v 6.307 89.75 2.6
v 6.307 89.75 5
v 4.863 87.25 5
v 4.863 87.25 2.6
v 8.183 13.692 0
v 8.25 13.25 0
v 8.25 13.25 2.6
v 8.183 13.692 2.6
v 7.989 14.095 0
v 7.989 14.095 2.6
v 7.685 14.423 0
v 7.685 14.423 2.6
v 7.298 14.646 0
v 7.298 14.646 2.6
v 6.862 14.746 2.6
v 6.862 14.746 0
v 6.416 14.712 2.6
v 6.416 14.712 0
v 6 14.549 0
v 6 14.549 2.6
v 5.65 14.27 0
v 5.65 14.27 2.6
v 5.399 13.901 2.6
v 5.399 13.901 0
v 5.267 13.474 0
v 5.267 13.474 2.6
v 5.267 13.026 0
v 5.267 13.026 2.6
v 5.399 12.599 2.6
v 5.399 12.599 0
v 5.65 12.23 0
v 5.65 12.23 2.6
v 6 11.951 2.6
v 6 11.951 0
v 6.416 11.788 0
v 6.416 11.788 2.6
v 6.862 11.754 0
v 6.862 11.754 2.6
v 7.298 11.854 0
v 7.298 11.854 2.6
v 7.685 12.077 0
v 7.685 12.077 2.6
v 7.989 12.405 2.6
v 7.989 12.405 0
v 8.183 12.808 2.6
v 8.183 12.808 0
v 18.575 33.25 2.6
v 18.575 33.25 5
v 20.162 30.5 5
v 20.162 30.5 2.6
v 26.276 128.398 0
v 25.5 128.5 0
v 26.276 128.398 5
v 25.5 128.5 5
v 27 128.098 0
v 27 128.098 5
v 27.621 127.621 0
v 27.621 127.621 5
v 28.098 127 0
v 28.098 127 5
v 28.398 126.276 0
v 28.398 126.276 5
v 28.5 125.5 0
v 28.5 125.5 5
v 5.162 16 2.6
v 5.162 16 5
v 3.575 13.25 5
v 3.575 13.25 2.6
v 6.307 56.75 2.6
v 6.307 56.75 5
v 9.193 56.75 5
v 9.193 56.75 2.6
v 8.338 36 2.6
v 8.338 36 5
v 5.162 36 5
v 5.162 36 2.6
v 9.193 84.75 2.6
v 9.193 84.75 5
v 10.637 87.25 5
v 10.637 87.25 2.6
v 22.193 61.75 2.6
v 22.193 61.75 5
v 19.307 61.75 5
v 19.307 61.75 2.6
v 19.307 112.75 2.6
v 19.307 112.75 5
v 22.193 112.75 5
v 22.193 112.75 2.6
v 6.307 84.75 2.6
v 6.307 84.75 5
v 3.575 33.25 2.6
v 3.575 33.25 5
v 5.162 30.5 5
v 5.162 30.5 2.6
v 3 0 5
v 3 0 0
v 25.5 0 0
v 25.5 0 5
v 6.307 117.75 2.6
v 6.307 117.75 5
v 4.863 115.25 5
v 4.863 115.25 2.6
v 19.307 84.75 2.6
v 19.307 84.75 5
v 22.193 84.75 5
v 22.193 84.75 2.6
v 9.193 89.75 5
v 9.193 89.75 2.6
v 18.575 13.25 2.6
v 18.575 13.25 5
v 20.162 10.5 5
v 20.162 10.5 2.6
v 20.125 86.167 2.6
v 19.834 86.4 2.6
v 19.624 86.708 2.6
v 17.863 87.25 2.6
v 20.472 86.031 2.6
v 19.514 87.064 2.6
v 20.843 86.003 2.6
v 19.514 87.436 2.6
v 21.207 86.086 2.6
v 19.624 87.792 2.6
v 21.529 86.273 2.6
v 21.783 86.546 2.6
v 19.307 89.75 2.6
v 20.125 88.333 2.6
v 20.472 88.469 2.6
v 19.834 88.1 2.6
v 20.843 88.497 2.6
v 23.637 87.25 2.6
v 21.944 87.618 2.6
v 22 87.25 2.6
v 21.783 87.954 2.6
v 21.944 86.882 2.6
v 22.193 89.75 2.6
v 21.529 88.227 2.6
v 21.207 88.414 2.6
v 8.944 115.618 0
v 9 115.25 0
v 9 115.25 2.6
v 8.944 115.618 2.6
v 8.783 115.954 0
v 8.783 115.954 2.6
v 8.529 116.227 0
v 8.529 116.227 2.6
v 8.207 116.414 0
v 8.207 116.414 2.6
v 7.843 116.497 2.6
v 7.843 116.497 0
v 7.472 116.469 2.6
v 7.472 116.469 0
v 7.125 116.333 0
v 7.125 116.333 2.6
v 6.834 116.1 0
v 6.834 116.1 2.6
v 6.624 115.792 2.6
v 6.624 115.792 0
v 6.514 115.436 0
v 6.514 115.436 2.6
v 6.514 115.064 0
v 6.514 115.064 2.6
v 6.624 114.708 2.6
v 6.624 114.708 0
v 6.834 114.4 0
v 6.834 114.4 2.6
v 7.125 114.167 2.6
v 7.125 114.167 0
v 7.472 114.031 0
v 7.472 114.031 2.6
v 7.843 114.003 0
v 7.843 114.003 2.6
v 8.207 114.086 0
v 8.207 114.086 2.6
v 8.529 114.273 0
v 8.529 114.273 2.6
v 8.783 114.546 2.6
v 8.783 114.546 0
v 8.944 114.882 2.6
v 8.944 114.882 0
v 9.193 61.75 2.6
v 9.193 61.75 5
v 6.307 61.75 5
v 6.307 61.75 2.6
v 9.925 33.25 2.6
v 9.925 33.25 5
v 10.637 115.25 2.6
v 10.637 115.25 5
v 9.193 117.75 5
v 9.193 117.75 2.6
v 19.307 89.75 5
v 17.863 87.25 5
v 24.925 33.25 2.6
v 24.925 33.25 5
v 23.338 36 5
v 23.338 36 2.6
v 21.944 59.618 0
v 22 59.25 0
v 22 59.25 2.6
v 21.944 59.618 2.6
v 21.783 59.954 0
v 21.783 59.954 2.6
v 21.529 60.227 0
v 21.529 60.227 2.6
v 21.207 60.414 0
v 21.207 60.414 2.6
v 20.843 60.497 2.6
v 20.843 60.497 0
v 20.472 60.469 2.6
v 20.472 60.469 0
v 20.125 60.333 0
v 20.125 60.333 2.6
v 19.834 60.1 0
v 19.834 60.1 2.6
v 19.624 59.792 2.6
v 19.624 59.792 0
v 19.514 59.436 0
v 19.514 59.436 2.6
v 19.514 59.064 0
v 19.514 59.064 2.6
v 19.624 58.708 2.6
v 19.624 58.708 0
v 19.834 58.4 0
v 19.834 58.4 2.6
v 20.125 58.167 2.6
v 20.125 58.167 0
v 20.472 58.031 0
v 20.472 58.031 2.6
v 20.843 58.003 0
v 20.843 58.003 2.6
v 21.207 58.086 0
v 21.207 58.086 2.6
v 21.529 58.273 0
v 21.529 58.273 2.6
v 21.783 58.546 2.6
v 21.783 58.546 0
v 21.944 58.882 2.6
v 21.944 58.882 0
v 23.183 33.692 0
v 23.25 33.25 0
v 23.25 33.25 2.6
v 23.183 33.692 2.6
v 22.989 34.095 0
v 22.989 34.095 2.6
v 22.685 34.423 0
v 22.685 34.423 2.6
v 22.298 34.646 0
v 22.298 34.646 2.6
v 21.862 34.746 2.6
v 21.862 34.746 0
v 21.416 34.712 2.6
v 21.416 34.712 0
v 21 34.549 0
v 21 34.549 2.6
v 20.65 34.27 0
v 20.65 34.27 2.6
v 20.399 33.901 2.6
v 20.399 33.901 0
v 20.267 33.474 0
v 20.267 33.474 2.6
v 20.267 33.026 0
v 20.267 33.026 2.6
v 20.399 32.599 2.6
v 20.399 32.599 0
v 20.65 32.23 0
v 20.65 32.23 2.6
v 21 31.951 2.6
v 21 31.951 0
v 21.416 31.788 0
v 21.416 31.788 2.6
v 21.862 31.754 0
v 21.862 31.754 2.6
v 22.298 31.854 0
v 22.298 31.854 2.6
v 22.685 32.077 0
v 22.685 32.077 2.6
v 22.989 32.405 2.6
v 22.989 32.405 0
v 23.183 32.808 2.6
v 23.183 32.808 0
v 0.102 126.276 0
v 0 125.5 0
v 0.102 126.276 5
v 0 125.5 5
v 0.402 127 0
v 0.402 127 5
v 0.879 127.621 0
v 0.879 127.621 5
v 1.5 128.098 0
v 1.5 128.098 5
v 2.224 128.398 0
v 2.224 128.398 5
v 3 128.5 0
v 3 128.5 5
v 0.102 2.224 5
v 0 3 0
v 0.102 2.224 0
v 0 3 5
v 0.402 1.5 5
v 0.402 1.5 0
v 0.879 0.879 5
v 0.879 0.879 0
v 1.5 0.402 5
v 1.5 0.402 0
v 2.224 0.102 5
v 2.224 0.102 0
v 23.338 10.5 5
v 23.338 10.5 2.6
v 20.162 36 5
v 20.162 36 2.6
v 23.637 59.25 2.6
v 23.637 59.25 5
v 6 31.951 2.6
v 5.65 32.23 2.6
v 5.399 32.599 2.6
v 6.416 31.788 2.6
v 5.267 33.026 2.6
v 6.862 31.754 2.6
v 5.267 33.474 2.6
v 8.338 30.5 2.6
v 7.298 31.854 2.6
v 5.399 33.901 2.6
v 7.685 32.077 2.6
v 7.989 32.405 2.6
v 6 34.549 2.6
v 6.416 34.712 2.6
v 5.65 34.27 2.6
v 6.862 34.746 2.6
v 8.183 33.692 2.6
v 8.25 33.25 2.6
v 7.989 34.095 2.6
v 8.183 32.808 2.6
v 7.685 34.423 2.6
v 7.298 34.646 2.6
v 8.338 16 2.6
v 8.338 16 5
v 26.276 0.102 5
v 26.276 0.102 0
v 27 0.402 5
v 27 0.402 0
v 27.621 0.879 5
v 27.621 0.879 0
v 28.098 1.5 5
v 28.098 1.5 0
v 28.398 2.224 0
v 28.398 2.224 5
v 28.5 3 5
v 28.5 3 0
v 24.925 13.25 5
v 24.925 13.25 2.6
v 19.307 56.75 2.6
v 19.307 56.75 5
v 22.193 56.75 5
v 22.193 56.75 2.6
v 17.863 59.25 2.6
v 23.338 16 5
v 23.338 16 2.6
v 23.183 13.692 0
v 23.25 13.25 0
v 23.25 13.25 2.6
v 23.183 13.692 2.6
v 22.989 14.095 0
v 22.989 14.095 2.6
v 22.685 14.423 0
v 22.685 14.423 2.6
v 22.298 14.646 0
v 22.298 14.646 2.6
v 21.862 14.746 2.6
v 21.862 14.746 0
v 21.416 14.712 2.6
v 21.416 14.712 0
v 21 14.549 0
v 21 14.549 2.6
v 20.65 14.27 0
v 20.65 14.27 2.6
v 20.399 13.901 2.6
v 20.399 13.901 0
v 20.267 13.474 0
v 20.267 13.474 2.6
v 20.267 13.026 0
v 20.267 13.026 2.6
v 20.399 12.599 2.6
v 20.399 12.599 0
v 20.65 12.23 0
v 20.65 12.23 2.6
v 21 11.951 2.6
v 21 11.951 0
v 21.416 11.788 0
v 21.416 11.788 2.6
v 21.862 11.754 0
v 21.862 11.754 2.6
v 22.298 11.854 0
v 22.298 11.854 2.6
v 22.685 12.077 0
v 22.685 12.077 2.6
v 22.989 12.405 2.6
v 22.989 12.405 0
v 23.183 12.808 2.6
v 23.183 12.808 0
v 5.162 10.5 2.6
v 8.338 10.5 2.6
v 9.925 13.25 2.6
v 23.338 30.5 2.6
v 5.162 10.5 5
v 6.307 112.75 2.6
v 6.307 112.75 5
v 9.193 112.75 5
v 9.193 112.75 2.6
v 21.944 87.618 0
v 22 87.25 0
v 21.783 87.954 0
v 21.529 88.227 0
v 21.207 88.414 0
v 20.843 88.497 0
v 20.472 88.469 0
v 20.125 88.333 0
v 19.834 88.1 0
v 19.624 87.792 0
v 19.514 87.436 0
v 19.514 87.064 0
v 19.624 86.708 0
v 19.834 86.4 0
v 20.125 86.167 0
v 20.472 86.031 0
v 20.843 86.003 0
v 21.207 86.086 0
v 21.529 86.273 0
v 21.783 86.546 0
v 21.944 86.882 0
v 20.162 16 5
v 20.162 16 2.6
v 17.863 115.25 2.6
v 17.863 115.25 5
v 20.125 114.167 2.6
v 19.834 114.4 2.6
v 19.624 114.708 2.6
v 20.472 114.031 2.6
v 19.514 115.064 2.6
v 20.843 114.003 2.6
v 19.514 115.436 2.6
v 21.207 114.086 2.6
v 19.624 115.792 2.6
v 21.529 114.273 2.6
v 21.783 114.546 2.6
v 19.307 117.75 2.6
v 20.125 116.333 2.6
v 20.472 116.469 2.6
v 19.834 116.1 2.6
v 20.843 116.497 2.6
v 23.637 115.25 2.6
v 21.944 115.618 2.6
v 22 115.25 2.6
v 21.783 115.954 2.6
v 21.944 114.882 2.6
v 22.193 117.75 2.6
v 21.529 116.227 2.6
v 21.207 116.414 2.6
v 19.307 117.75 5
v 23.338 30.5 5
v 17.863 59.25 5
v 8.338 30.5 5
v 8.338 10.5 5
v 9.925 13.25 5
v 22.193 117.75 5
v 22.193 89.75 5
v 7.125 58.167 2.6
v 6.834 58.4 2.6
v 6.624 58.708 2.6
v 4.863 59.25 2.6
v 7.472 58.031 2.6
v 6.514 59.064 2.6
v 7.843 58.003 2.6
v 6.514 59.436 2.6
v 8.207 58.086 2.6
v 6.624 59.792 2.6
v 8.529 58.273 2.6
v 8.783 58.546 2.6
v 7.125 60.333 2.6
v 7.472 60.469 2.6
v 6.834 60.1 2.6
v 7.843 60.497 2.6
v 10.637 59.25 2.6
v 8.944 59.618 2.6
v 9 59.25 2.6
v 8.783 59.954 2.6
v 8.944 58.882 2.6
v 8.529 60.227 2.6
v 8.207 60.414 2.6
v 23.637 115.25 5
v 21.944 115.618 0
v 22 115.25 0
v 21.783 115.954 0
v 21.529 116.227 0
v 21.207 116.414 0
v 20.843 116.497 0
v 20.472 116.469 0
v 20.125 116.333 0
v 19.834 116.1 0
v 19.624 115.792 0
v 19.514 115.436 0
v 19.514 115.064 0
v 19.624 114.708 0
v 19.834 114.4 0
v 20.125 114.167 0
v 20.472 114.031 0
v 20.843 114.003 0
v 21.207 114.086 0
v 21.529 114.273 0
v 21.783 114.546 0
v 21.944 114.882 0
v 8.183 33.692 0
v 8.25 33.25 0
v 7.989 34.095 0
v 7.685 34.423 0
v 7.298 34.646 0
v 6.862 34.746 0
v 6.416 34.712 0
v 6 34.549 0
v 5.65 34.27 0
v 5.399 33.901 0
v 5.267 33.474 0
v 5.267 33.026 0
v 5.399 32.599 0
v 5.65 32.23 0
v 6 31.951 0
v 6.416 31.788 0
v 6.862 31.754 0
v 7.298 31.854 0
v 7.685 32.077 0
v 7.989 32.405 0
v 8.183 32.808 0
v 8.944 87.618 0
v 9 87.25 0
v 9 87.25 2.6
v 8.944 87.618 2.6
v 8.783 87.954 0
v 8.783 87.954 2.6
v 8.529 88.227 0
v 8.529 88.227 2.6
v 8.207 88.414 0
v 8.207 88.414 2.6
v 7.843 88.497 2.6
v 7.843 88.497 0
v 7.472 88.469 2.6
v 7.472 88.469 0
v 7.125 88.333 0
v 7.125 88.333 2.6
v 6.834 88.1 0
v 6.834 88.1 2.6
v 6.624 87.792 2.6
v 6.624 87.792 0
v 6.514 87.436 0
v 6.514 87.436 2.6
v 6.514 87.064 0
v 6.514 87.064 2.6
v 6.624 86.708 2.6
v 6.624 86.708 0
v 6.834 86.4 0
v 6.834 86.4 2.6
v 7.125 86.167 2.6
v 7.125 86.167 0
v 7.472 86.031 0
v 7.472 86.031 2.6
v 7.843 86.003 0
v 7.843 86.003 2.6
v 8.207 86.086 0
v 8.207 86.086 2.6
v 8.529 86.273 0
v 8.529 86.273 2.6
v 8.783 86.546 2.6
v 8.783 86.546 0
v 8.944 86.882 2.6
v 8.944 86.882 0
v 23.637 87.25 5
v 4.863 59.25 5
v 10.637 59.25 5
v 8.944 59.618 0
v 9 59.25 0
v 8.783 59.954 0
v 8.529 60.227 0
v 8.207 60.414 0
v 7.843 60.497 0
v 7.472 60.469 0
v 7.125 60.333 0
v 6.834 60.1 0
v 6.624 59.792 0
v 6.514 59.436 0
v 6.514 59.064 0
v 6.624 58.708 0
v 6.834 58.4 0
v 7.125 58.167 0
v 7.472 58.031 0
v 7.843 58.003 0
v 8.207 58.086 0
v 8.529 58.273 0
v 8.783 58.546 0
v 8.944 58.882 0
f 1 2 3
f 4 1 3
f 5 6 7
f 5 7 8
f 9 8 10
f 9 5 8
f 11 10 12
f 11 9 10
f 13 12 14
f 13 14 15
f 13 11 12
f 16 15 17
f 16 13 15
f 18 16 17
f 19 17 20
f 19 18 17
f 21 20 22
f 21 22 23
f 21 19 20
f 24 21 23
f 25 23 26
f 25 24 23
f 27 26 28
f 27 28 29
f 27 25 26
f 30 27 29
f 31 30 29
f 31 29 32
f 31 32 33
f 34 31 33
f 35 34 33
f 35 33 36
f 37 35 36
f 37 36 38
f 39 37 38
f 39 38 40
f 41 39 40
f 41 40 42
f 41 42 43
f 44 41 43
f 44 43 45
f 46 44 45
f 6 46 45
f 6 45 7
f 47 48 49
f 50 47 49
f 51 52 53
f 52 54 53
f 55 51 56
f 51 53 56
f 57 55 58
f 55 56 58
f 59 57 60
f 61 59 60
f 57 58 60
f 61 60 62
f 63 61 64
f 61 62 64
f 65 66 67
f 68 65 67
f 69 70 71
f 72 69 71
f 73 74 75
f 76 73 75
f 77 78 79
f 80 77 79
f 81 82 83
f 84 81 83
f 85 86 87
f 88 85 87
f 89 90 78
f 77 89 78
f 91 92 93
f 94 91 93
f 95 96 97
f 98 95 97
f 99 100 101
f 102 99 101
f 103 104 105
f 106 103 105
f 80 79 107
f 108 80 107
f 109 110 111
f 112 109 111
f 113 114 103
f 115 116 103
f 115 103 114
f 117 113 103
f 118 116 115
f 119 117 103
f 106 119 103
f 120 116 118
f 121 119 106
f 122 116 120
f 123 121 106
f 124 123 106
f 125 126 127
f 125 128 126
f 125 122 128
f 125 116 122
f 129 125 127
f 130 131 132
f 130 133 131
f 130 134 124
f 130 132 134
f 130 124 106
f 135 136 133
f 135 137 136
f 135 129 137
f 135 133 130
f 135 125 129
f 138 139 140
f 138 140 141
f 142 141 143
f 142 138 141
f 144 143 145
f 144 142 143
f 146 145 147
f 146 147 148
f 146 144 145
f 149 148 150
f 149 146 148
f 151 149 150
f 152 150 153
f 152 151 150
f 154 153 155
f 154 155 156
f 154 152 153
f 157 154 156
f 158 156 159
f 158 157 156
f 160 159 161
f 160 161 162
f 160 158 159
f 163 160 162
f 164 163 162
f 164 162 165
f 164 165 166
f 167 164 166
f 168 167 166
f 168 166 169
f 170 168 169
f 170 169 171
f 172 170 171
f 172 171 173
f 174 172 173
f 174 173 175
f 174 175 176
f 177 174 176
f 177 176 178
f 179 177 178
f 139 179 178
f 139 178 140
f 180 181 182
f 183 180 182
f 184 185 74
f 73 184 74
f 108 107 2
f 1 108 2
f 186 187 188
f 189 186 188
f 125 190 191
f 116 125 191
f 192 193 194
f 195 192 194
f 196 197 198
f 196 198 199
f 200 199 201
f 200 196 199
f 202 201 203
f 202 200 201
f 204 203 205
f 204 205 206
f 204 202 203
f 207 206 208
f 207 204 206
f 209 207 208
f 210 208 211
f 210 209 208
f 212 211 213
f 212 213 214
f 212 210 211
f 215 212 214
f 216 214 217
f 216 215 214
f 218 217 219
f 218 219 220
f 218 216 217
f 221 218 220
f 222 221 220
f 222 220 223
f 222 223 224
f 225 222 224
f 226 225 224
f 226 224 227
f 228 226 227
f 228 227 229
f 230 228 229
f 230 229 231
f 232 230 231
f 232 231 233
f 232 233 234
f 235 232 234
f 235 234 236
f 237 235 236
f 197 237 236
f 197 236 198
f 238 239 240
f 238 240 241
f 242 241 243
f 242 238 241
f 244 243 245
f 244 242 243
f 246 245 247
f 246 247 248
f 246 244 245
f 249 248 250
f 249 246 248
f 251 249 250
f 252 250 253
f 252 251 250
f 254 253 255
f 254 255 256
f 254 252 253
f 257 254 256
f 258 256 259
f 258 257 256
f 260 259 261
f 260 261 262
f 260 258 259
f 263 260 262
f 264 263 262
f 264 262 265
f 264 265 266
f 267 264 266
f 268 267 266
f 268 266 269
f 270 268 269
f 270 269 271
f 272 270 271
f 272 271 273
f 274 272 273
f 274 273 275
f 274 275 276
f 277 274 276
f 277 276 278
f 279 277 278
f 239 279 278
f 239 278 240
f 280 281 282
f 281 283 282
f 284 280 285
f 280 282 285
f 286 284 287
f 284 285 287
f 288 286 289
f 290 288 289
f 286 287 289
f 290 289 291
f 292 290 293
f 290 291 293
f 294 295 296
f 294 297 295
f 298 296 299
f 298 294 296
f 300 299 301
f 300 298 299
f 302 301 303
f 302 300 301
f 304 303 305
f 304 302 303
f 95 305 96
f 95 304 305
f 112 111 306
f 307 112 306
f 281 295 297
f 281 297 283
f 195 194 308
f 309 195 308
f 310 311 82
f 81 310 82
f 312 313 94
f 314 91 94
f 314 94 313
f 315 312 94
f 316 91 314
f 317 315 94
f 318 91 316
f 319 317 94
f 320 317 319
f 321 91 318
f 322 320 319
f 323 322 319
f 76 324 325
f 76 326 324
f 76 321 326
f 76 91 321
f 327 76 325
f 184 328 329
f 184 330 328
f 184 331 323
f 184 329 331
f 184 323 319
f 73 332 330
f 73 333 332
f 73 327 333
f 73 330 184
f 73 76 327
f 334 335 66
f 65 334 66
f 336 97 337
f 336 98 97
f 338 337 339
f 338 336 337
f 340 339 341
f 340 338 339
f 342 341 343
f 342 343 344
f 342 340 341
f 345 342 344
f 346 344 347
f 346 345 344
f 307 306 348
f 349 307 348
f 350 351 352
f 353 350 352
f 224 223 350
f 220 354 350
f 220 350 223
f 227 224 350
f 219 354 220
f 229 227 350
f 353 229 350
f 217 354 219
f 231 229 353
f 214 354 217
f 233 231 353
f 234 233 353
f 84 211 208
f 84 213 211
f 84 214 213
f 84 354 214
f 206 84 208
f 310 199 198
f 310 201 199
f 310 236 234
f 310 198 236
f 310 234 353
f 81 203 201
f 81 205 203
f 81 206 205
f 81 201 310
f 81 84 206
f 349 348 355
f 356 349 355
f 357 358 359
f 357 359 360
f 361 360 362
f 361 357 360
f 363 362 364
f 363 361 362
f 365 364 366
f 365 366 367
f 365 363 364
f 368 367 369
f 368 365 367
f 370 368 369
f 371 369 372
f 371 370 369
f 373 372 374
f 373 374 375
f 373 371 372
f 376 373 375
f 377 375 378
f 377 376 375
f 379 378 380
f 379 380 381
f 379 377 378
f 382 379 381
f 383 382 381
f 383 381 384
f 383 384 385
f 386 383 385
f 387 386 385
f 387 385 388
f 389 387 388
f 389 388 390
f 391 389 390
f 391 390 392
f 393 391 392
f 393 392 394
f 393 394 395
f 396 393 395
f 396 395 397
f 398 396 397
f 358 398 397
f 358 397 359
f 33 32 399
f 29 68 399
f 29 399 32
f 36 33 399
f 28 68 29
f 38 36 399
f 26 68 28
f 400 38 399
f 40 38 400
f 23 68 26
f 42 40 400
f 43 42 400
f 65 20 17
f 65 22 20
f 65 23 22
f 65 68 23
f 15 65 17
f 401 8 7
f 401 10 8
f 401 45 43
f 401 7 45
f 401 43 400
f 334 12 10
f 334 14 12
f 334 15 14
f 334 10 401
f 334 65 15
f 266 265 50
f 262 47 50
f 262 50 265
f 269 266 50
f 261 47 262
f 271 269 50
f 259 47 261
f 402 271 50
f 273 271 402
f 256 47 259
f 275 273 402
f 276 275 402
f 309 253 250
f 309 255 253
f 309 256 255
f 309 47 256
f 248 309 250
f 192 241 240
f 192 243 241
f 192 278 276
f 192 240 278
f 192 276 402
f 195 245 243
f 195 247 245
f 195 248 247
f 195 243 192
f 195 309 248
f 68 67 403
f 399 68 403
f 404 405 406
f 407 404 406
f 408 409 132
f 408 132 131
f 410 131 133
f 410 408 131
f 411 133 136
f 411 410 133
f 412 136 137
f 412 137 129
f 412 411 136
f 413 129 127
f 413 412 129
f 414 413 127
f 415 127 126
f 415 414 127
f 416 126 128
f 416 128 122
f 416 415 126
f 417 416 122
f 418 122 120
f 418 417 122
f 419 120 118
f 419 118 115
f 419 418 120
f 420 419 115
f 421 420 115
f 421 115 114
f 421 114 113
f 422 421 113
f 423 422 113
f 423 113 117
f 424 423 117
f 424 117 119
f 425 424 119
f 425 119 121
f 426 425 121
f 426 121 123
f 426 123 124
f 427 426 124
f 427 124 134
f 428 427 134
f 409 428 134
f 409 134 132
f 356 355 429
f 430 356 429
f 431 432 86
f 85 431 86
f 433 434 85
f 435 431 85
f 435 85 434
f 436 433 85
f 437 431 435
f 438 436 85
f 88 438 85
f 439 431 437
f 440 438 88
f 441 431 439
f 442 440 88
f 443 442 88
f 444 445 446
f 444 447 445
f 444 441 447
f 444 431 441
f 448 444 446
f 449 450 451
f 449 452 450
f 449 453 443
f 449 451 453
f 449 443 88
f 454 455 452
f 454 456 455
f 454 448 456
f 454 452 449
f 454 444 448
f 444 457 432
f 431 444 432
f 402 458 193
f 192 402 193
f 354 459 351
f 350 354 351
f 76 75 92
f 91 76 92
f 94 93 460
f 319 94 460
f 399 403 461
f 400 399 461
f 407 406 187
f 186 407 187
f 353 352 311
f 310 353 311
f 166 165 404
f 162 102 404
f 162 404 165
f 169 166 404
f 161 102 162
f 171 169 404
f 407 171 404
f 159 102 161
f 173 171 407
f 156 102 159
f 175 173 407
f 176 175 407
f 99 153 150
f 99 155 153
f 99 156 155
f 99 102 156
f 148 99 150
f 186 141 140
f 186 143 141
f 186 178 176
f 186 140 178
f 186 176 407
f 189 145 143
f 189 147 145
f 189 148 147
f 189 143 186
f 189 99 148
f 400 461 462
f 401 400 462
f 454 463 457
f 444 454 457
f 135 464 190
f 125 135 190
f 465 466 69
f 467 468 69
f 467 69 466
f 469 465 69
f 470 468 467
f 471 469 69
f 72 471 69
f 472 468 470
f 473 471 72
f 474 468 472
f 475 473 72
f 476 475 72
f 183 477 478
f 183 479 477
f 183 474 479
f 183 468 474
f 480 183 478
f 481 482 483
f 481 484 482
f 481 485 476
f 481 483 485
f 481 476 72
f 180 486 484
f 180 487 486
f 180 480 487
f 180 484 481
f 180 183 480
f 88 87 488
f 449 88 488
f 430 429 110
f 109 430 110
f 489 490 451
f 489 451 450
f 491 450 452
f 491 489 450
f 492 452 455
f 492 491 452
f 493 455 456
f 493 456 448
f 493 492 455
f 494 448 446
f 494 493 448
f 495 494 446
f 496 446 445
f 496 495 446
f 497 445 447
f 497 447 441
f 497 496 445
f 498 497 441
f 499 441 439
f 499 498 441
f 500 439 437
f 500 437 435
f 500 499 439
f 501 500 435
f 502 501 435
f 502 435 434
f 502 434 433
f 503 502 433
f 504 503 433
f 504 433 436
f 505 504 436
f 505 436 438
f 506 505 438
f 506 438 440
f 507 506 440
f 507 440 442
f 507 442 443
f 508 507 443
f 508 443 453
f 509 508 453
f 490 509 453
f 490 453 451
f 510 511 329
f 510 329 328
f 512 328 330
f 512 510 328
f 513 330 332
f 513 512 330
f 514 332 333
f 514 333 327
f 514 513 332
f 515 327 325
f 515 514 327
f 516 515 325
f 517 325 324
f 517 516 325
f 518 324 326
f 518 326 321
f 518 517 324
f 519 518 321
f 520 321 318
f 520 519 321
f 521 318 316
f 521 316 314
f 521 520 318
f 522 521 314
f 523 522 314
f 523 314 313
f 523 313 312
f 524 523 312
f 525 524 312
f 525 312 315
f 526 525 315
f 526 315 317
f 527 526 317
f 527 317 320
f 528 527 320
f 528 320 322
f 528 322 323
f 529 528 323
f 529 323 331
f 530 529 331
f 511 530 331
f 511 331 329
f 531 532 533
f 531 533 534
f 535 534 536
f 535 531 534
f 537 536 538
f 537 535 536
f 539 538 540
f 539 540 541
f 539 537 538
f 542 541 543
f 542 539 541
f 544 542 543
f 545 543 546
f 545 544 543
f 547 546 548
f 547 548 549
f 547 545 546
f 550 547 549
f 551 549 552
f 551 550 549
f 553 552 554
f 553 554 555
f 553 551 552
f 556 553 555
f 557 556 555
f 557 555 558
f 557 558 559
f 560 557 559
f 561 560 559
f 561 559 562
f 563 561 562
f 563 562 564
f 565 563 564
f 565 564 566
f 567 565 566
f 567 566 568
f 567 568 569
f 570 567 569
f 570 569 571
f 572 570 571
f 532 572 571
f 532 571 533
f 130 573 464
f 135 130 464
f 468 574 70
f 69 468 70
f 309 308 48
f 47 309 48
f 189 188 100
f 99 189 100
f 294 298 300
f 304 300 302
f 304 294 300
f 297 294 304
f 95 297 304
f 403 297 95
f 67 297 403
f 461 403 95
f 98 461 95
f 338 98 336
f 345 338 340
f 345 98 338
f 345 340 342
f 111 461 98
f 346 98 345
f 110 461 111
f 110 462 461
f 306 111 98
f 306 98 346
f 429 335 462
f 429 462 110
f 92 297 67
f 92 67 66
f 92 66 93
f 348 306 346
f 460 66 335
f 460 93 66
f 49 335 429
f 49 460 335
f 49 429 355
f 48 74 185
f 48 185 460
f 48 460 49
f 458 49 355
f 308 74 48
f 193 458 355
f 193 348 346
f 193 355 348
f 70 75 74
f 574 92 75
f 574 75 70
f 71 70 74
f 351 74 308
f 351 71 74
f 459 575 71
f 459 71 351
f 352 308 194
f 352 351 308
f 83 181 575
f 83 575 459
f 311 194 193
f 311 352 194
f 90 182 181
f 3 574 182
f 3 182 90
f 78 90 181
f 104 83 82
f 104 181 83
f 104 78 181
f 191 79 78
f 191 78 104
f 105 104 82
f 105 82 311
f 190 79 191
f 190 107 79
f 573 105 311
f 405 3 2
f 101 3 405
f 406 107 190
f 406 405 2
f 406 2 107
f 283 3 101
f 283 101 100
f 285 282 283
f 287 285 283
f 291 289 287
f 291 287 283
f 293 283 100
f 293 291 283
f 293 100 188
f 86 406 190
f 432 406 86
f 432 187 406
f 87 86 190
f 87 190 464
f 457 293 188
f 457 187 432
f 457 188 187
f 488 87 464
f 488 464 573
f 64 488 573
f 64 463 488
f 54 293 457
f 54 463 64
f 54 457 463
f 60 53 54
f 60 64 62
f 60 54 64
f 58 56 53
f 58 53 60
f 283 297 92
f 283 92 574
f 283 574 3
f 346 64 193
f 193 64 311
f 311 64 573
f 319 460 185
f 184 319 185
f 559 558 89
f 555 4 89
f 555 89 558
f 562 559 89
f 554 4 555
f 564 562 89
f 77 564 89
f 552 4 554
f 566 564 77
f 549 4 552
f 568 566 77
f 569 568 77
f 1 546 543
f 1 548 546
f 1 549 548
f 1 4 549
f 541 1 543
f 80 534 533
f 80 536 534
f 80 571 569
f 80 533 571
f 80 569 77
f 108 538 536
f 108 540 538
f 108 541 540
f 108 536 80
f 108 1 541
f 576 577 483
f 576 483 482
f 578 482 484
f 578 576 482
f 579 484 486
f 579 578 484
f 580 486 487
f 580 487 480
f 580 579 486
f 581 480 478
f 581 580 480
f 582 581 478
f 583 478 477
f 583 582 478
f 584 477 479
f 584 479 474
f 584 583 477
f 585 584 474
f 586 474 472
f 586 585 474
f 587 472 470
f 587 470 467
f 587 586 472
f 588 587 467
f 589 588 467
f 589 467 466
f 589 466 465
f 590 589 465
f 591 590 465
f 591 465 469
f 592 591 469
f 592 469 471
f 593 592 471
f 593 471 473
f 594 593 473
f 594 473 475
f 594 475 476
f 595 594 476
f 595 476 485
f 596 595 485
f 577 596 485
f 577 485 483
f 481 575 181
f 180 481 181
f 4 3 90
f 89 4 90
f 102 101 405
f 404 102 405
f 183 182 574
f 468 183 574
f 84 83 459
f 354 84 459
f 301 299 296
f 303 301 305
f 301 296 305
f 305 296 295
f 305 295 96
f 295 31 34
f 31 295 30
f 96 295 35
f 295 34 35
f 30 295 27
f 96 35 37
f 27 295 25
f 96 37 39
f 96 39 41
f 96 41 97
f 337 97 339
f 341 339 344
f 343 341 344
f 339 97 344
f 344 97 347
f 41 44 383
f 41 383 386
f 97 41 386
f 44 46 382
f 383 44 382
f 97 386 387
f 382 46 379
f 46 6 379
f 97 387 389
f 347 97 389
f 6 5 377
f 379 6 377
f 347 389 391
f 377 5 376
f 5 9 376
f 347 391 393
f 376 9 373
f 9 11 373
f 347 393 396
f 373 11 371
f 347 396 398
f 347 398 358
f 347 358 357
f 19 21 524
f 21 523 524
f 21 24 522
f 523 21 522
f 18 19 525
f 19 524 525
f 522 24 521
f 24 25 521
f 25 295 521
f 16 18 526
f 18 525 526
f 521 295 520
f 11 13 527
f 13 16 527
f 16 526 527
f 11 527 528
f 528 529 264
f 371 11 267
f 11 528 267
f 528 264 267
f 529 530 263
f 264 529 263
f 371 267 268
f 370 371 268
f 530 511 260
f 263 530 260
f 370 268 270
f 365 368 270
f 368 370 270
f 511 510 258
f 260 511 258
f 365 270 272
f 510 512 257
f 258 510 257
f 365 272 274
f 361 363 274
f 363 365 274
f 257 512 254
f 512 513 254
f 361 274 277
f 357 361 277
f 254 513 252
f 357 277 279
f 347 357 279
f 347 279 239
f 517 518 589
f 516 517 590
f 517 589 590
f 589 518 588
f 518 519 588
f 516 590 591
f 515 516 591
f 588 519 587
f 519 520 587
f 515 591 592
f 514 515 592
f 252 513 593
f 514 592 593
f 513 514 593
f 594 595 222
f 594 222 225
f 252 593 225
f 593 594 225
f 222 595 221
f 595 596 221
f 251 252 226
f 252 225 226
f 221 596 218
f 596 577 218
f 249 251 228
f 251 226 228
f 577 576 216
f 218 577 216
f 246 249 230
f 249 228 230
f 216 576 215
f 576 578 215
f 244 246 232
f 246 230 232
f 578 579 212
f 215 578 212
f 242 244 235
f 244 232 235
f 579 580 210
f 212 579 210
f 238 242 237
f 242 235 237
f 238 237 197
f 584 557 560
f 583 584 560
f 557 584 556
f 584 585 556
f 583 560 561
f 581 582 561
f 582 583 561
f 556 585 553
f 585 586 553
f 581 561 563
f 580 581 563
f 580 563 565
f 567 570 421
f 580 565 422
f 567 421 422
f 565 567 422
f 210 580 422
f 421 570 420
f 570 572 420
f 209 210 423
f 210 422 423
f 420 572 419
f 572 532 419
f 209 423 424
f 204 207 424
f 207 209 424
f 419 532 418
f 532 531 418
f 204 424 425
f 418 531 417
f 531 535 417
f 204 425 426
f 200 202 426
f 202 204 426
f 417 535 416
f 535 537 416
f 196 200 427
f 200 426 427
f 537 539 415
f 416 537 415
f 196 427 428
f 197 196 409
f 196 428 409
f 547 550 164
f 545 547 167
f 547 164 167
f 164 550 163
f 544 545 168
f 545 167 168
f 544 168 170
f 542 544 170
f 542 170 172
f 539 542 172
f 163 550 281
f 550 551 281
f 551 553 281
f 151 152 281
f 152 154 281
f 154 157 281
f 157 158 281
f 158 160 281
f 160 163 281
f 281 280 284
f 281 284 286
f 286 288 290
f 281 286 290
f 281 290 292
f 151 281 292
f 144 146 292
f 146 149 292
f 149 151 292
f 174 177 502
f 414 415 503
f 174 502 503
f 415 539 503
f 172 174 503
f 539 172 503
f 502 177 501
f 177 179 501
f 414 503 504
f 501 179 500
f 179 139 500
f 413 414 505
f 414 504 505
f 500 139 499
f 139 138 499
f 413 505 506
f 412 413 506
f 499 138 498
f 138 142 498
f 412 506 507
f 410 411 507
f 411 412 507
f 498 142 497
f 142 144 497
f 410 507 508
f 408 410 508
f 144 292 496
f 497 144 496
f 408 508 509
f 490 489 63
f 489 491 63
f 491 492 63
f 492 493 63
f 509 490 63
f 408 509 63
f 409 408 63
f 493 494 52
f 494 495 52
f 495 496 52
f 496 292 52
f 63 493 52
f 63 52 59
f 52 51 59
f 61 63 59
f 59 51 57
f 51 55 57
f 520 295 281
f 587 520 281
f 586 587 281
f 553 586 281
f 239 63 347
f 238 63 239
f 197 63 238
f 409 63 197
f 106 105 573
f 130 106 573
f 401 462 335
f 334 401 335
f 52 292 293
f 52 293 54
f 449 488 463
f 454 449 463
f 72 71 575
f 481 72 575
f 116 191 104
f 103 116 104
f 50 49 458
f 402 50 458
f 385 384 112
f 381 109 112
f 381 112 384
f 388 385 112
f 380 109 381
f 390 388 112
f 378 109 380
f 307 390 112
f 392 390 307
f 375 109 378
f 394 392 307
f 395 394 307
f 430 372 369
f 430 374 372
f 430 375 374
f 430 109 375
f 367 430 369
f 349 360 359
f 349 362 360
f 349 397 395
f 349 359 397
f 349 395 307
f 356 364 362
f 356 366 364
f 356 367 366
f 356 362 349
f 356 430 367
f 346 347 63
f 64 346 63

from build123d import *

# Parameters (mm, degrees)
F0_W     = 28.5
F0_H     = 128.5
F0_R     = 1.5
F0_R_2   = 1.25
F1_DEPTH = 5
F2_R     = 1.25
F2_R_2   = 1.5
F3_DEPTH = 2.4
F4_R     = 3


with BuildPart() as f1:
    # F0 (on Top) → F1 (new body)
    with BuildSketch(Plane.XY):
        with Locations((14.25, 64.25)):
            Rectangle(F0_W, F0_H)
        with Locations((6.75, 13.25)):
            Circle(F0_R, mode=Mode.SUBTRACT)
        with Locations((6.75, 33.25)):
            Circle(F0_R, mode=Mode.SUBTRACT)
        with Locations((7.75, 59.25)):
            Circle(F0_R_2, mode=Mode.SUBTRACT)
        with Locations((21.75, 13.25)):
            Circle(F0_R, mode=Mode.SUBTRACT)
        with Locations((20.75, 59.25)):
            Circle(F0_R_2, mode=Mode.SUBTRACT)
        with Locations((21.75, 33.25)):
            Circle(F0_R, mode=Mode.SUBTRACT)
        with Locations((7.75, 87.25)):
            Circle(F0_R_2, mode=Mode.SUBTRACT)
        with Locations((7.75, 115.25)):
            Circle(F0_R_2, mode=Mode.SUBTRACT)
        with Locations((20.75, 87.25)):
            Circle(F0_R_2, mode=Mode.SUBTRACT)
        with Locations((20.75, 115.25)):
            Circle(F0_R_2, mode=Mode.SUBTRACT)
    extrude(amount=F1_DEPTH)

    # F2 (on face) → F3 (cut)
    with BuildSketch(Plane.XY.offset(5)):
        Polygon((6.306624, 84.75), (9.193376, 84.75), (10.636751, 87.25), (9.193376, 89.75), (6.306624, 89.75), (4.863249, 87.25), align=None)
        with Locations((7.75, 87.25)):
            Circle(F2_R, mode=Mode.SUBTRACT)
        Polygon((19.306624, 84.75), (22.193376, 84.75), (23.636751, 87.25), (22.193376, 89.75), (19.306624, 89.75), (17.863249, 87.25), align=None)
        with Locations((20.75, 87.25)):
            Circle(F2_R, mode=Mode.SUBTRACT)
        Polygon((6.306624, 112.75), (9.193376, 112.75), (10.636751, 115.25), (9.193376, 117.75), (6.306624, 117.75), (4.863249, 115.25), align=None)
        with Locations((7.75, 115.25)):
            Circle(F2_R, mode=Mode.SUBTRACT)
        Polygon((19.306624, 112.75), (22.193376, 112.75), (23.636751, 115.25), (22.193376, 117.75), (19.306624, 117.75), (17.863249, 115.25), align=None)
        with Locations((20.75, 115.25)):
            Circle(F2_R, mode=Mode.SUBTRACT)
        Polygon((19.306624, 56.75), (22.193376, 56.75), (23.636751, 59.25), (22.193376, 61.75), (19.306624, 61.75), (17.863249, 59.25), align=None)
        with Locations((20.75, 59.25)):
            Circle(F2_R, mode=Mode.SUBTRACT)
        Polygon((6.306624, 56.75), (9.193376, 56.75), (10.636751, 59.25), (9.193376, 61.75), (6.306624, 61.75), (4.863249, 59.25), align=None)
        with Locations((7.75, 59.25)):
            Circle(F2_R, mode=Mode.SUBTRACT)
        Polygon((5.162287, 30.5), (8.337713, 30.5), (9.925426, 33.25), (8.337713, 36), (5.162287, 36), (3.574574, 33.25), align=None)
        with Locations((6.75, 33.25)):
            Circle(F2_R_2, mode=Mode.SUBTRACT)
        Polygon((20.162287, 10.5), (23.337713, 10.5), (24.925426, 13.25), (23.337713, 16), (20.162287, 16), (18.574574, 13.25), align=None)
        with Locations((21.75, 13.25)):
            Circle(F2_R_2, mode=Mode.SUBTRACT)
        Polygon((5.162287, 10.5), (8.337713, 10.5), (9.925426, 13.25), (8.337713, 16), (5.162287, 16), (3.574574, 13.25), align=None)
        with Locations((6.75, 13.25)):
            Circle(F2_R_2, mode=Mode.SUBTRACT)
        Polygon((20.162287, 30.5), (23.337713, 30.5), (24.925426, 33.25), (23.337713, 36), (20.162287, 36), (18.574574, 33.25), align=None)
        with Locations((21.75, 33.25)):
            Circle(F2_R_2, mode=Mode.SUBTRACT)
    extrude(amount=-F3_DEPTH, mode=Mode.SUBTRACT)

    # F4
    f4_edges = [f1.edges().sort_by_distance(p)[0] for p in [
        (0, 0, 2.5),
        (28.5, 0, 2.5),
        (0, 128.5, 2.5),
        (28.5, 128.5, 2.5),
    ]]
    fillet(f4_edges, radius=F4_R)


solid = f1.part
